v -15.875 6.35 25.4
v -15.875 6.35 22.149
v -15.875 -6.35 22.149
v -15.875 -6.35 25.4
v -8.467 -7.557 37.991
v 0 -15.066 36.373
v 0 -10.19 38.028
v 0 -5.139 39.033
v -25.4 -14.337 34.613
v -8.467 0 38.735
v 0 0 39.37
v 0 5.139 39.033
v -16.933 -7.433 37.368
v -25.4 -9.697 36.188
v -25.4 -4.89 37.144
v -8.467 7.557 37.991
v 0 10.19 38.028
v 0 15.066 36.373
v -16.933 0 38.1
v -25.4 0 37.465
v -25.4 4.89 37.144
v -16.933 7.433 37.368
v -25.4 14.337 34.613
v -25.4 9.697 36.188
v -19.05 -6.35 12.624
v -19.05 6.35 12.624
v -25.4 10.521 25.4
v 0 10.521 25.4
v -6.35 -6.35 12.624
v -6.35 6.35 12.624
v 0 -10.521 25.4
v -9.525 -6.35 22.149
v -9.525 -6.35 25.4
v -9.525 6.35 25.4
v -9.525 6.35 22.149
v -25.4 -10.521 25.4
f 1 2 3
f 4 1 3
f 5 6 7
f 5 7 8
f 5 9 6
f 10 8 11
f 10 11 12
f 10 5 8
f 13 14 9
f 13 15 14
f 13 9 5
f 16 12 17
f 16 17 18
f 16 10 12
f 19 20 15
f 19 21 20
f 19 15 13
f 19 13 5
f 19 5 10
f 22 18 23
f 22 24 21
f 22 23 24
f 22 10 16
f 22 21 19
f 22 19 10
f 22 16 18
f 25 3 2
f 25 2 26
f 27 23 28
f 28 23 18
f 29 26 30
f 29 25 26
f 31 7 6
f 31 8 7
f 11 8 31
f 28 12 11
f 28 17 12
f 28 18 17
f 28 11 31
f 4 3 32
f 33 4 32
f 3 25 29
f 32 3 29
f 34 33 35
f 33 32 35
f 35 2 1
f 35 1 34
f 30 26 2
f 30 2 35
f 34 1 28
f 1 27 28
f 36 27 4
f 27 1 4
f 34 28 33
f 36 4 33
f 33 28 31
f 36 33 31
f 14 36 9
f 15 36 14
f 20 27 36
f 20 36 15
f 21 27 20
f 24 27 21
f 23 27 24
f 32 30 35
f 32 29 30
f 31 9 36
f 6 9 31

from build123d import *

# Parameters (mm, degrees)
F1_DEPTH      = 6.35
F2_ANGLE_BACK = 22.5
F2_ANGLE      = 45
F4_DEPTH      = 25.401
F5_DEPTH      = 2.54


with BuildPart() as f1:
    # F0 (on Front) → F1 (new body, symmetric)
    with BuildSketch(Plane.XZ):
        Polygon((-9.525, 22.1488), (-9.525, 25.4), (-15.875, 25.4), (-15.875, 22.1488), (-19.05, 12.6238), (-6.35, 12.6238), align=None)
    extrude(amount=F1_DEPTH, both=True)

    # F0 (on Front) → F2 (revolve)
    with BuildSketch(Plane.XZ, mode=Mode.PRIVATE) as f2_sk:
        Polygon((-9.525, 25.4), (0, 25.4), (0, 39.37), (-25.4, 37.465), (-25.4, 25.4), (-15.875, 25.4), align=None)
    revolve(f2_sk.sketch.rotate(Axis((-30.5623934027, 0, 0), (-1, 0, 0)), -F2_ANGLE_BACK), axis=Axis((-30.5623934027, 0, 0), (-1, 0, 0)), revolution_arc=F2_ANGLE)

    # F3 (on face) → F4 (cut, through all)
    with BuildSketch(Plane.YZ):
        with BuildLine():
            Line((11.3784447312, 25.4), (10.5210244843, 25.4))
            Line((10.5210244843, 25.4), (9.7201591821, 23.4665401258))
            ThreePointArc((9.7201591821, 23.4665401258), (4.9552941792, 24.9119461222), (0, 25.4))
            Line((0, 25.4), (0, 22.86))
            Line((0, 22.86), (11.3784447312, 22.86))
            Line((11.3784447312, 22.86), (11.3784447312, 25.4))
        make_face()
        with BuildLine():
            Line((9.7201591821, 23.4665401258), (10.5210244843, 25.4))
            Line((10.5210244843, 25.4), (0, 25.4))
            ThreePointArc((0, 25.4), (4.9552941792, 24.9119461222), (9.7201591821, 23.4665401258))
        make_face()
        with BuildLine():
            Line((0, 22.86), (0, 25.4))
            ThreePointArc((0, 25.4), (-4.9552941792, 24.9119461222), (-9.7201591821, 23.4665401258))
            Line((-9.7201591821, 23.4665401258), (-10.5210244843, 25.4))
            Line((-10.5210244843, 25.4), (-11.5035856143, 25.4))
            Line((-11.5035856143, 25.4), (-11.5035856143, 22.86))
            Line((-11.5035856143, 22.86), (0, 22.86))
        make_face()
        with BuildLine():
            ThreePointArc((-9.7201591821, 23.4665401258), (-4.9552941792, 24.9119461222), (0, 25.4))
            Line((0, 25.4), (-10.5210244843, 25.4))
            Line((-10.5210244843, 25.4), (-9.7201591821, 23.4665401258))
        make_face()
    extrude(amount=-F4_DEPTH, mode=Mode.SUBTRACT)

    # F5 (add, through all): a face of the model
    f5_faces = [f1.faces().sort_by_distance(p)[0] for p in [
        (-12.7, 0, 22.86),
    ]]
    extrude(f5_faces, amount=F5_DEPTH)


solid = f1.part
